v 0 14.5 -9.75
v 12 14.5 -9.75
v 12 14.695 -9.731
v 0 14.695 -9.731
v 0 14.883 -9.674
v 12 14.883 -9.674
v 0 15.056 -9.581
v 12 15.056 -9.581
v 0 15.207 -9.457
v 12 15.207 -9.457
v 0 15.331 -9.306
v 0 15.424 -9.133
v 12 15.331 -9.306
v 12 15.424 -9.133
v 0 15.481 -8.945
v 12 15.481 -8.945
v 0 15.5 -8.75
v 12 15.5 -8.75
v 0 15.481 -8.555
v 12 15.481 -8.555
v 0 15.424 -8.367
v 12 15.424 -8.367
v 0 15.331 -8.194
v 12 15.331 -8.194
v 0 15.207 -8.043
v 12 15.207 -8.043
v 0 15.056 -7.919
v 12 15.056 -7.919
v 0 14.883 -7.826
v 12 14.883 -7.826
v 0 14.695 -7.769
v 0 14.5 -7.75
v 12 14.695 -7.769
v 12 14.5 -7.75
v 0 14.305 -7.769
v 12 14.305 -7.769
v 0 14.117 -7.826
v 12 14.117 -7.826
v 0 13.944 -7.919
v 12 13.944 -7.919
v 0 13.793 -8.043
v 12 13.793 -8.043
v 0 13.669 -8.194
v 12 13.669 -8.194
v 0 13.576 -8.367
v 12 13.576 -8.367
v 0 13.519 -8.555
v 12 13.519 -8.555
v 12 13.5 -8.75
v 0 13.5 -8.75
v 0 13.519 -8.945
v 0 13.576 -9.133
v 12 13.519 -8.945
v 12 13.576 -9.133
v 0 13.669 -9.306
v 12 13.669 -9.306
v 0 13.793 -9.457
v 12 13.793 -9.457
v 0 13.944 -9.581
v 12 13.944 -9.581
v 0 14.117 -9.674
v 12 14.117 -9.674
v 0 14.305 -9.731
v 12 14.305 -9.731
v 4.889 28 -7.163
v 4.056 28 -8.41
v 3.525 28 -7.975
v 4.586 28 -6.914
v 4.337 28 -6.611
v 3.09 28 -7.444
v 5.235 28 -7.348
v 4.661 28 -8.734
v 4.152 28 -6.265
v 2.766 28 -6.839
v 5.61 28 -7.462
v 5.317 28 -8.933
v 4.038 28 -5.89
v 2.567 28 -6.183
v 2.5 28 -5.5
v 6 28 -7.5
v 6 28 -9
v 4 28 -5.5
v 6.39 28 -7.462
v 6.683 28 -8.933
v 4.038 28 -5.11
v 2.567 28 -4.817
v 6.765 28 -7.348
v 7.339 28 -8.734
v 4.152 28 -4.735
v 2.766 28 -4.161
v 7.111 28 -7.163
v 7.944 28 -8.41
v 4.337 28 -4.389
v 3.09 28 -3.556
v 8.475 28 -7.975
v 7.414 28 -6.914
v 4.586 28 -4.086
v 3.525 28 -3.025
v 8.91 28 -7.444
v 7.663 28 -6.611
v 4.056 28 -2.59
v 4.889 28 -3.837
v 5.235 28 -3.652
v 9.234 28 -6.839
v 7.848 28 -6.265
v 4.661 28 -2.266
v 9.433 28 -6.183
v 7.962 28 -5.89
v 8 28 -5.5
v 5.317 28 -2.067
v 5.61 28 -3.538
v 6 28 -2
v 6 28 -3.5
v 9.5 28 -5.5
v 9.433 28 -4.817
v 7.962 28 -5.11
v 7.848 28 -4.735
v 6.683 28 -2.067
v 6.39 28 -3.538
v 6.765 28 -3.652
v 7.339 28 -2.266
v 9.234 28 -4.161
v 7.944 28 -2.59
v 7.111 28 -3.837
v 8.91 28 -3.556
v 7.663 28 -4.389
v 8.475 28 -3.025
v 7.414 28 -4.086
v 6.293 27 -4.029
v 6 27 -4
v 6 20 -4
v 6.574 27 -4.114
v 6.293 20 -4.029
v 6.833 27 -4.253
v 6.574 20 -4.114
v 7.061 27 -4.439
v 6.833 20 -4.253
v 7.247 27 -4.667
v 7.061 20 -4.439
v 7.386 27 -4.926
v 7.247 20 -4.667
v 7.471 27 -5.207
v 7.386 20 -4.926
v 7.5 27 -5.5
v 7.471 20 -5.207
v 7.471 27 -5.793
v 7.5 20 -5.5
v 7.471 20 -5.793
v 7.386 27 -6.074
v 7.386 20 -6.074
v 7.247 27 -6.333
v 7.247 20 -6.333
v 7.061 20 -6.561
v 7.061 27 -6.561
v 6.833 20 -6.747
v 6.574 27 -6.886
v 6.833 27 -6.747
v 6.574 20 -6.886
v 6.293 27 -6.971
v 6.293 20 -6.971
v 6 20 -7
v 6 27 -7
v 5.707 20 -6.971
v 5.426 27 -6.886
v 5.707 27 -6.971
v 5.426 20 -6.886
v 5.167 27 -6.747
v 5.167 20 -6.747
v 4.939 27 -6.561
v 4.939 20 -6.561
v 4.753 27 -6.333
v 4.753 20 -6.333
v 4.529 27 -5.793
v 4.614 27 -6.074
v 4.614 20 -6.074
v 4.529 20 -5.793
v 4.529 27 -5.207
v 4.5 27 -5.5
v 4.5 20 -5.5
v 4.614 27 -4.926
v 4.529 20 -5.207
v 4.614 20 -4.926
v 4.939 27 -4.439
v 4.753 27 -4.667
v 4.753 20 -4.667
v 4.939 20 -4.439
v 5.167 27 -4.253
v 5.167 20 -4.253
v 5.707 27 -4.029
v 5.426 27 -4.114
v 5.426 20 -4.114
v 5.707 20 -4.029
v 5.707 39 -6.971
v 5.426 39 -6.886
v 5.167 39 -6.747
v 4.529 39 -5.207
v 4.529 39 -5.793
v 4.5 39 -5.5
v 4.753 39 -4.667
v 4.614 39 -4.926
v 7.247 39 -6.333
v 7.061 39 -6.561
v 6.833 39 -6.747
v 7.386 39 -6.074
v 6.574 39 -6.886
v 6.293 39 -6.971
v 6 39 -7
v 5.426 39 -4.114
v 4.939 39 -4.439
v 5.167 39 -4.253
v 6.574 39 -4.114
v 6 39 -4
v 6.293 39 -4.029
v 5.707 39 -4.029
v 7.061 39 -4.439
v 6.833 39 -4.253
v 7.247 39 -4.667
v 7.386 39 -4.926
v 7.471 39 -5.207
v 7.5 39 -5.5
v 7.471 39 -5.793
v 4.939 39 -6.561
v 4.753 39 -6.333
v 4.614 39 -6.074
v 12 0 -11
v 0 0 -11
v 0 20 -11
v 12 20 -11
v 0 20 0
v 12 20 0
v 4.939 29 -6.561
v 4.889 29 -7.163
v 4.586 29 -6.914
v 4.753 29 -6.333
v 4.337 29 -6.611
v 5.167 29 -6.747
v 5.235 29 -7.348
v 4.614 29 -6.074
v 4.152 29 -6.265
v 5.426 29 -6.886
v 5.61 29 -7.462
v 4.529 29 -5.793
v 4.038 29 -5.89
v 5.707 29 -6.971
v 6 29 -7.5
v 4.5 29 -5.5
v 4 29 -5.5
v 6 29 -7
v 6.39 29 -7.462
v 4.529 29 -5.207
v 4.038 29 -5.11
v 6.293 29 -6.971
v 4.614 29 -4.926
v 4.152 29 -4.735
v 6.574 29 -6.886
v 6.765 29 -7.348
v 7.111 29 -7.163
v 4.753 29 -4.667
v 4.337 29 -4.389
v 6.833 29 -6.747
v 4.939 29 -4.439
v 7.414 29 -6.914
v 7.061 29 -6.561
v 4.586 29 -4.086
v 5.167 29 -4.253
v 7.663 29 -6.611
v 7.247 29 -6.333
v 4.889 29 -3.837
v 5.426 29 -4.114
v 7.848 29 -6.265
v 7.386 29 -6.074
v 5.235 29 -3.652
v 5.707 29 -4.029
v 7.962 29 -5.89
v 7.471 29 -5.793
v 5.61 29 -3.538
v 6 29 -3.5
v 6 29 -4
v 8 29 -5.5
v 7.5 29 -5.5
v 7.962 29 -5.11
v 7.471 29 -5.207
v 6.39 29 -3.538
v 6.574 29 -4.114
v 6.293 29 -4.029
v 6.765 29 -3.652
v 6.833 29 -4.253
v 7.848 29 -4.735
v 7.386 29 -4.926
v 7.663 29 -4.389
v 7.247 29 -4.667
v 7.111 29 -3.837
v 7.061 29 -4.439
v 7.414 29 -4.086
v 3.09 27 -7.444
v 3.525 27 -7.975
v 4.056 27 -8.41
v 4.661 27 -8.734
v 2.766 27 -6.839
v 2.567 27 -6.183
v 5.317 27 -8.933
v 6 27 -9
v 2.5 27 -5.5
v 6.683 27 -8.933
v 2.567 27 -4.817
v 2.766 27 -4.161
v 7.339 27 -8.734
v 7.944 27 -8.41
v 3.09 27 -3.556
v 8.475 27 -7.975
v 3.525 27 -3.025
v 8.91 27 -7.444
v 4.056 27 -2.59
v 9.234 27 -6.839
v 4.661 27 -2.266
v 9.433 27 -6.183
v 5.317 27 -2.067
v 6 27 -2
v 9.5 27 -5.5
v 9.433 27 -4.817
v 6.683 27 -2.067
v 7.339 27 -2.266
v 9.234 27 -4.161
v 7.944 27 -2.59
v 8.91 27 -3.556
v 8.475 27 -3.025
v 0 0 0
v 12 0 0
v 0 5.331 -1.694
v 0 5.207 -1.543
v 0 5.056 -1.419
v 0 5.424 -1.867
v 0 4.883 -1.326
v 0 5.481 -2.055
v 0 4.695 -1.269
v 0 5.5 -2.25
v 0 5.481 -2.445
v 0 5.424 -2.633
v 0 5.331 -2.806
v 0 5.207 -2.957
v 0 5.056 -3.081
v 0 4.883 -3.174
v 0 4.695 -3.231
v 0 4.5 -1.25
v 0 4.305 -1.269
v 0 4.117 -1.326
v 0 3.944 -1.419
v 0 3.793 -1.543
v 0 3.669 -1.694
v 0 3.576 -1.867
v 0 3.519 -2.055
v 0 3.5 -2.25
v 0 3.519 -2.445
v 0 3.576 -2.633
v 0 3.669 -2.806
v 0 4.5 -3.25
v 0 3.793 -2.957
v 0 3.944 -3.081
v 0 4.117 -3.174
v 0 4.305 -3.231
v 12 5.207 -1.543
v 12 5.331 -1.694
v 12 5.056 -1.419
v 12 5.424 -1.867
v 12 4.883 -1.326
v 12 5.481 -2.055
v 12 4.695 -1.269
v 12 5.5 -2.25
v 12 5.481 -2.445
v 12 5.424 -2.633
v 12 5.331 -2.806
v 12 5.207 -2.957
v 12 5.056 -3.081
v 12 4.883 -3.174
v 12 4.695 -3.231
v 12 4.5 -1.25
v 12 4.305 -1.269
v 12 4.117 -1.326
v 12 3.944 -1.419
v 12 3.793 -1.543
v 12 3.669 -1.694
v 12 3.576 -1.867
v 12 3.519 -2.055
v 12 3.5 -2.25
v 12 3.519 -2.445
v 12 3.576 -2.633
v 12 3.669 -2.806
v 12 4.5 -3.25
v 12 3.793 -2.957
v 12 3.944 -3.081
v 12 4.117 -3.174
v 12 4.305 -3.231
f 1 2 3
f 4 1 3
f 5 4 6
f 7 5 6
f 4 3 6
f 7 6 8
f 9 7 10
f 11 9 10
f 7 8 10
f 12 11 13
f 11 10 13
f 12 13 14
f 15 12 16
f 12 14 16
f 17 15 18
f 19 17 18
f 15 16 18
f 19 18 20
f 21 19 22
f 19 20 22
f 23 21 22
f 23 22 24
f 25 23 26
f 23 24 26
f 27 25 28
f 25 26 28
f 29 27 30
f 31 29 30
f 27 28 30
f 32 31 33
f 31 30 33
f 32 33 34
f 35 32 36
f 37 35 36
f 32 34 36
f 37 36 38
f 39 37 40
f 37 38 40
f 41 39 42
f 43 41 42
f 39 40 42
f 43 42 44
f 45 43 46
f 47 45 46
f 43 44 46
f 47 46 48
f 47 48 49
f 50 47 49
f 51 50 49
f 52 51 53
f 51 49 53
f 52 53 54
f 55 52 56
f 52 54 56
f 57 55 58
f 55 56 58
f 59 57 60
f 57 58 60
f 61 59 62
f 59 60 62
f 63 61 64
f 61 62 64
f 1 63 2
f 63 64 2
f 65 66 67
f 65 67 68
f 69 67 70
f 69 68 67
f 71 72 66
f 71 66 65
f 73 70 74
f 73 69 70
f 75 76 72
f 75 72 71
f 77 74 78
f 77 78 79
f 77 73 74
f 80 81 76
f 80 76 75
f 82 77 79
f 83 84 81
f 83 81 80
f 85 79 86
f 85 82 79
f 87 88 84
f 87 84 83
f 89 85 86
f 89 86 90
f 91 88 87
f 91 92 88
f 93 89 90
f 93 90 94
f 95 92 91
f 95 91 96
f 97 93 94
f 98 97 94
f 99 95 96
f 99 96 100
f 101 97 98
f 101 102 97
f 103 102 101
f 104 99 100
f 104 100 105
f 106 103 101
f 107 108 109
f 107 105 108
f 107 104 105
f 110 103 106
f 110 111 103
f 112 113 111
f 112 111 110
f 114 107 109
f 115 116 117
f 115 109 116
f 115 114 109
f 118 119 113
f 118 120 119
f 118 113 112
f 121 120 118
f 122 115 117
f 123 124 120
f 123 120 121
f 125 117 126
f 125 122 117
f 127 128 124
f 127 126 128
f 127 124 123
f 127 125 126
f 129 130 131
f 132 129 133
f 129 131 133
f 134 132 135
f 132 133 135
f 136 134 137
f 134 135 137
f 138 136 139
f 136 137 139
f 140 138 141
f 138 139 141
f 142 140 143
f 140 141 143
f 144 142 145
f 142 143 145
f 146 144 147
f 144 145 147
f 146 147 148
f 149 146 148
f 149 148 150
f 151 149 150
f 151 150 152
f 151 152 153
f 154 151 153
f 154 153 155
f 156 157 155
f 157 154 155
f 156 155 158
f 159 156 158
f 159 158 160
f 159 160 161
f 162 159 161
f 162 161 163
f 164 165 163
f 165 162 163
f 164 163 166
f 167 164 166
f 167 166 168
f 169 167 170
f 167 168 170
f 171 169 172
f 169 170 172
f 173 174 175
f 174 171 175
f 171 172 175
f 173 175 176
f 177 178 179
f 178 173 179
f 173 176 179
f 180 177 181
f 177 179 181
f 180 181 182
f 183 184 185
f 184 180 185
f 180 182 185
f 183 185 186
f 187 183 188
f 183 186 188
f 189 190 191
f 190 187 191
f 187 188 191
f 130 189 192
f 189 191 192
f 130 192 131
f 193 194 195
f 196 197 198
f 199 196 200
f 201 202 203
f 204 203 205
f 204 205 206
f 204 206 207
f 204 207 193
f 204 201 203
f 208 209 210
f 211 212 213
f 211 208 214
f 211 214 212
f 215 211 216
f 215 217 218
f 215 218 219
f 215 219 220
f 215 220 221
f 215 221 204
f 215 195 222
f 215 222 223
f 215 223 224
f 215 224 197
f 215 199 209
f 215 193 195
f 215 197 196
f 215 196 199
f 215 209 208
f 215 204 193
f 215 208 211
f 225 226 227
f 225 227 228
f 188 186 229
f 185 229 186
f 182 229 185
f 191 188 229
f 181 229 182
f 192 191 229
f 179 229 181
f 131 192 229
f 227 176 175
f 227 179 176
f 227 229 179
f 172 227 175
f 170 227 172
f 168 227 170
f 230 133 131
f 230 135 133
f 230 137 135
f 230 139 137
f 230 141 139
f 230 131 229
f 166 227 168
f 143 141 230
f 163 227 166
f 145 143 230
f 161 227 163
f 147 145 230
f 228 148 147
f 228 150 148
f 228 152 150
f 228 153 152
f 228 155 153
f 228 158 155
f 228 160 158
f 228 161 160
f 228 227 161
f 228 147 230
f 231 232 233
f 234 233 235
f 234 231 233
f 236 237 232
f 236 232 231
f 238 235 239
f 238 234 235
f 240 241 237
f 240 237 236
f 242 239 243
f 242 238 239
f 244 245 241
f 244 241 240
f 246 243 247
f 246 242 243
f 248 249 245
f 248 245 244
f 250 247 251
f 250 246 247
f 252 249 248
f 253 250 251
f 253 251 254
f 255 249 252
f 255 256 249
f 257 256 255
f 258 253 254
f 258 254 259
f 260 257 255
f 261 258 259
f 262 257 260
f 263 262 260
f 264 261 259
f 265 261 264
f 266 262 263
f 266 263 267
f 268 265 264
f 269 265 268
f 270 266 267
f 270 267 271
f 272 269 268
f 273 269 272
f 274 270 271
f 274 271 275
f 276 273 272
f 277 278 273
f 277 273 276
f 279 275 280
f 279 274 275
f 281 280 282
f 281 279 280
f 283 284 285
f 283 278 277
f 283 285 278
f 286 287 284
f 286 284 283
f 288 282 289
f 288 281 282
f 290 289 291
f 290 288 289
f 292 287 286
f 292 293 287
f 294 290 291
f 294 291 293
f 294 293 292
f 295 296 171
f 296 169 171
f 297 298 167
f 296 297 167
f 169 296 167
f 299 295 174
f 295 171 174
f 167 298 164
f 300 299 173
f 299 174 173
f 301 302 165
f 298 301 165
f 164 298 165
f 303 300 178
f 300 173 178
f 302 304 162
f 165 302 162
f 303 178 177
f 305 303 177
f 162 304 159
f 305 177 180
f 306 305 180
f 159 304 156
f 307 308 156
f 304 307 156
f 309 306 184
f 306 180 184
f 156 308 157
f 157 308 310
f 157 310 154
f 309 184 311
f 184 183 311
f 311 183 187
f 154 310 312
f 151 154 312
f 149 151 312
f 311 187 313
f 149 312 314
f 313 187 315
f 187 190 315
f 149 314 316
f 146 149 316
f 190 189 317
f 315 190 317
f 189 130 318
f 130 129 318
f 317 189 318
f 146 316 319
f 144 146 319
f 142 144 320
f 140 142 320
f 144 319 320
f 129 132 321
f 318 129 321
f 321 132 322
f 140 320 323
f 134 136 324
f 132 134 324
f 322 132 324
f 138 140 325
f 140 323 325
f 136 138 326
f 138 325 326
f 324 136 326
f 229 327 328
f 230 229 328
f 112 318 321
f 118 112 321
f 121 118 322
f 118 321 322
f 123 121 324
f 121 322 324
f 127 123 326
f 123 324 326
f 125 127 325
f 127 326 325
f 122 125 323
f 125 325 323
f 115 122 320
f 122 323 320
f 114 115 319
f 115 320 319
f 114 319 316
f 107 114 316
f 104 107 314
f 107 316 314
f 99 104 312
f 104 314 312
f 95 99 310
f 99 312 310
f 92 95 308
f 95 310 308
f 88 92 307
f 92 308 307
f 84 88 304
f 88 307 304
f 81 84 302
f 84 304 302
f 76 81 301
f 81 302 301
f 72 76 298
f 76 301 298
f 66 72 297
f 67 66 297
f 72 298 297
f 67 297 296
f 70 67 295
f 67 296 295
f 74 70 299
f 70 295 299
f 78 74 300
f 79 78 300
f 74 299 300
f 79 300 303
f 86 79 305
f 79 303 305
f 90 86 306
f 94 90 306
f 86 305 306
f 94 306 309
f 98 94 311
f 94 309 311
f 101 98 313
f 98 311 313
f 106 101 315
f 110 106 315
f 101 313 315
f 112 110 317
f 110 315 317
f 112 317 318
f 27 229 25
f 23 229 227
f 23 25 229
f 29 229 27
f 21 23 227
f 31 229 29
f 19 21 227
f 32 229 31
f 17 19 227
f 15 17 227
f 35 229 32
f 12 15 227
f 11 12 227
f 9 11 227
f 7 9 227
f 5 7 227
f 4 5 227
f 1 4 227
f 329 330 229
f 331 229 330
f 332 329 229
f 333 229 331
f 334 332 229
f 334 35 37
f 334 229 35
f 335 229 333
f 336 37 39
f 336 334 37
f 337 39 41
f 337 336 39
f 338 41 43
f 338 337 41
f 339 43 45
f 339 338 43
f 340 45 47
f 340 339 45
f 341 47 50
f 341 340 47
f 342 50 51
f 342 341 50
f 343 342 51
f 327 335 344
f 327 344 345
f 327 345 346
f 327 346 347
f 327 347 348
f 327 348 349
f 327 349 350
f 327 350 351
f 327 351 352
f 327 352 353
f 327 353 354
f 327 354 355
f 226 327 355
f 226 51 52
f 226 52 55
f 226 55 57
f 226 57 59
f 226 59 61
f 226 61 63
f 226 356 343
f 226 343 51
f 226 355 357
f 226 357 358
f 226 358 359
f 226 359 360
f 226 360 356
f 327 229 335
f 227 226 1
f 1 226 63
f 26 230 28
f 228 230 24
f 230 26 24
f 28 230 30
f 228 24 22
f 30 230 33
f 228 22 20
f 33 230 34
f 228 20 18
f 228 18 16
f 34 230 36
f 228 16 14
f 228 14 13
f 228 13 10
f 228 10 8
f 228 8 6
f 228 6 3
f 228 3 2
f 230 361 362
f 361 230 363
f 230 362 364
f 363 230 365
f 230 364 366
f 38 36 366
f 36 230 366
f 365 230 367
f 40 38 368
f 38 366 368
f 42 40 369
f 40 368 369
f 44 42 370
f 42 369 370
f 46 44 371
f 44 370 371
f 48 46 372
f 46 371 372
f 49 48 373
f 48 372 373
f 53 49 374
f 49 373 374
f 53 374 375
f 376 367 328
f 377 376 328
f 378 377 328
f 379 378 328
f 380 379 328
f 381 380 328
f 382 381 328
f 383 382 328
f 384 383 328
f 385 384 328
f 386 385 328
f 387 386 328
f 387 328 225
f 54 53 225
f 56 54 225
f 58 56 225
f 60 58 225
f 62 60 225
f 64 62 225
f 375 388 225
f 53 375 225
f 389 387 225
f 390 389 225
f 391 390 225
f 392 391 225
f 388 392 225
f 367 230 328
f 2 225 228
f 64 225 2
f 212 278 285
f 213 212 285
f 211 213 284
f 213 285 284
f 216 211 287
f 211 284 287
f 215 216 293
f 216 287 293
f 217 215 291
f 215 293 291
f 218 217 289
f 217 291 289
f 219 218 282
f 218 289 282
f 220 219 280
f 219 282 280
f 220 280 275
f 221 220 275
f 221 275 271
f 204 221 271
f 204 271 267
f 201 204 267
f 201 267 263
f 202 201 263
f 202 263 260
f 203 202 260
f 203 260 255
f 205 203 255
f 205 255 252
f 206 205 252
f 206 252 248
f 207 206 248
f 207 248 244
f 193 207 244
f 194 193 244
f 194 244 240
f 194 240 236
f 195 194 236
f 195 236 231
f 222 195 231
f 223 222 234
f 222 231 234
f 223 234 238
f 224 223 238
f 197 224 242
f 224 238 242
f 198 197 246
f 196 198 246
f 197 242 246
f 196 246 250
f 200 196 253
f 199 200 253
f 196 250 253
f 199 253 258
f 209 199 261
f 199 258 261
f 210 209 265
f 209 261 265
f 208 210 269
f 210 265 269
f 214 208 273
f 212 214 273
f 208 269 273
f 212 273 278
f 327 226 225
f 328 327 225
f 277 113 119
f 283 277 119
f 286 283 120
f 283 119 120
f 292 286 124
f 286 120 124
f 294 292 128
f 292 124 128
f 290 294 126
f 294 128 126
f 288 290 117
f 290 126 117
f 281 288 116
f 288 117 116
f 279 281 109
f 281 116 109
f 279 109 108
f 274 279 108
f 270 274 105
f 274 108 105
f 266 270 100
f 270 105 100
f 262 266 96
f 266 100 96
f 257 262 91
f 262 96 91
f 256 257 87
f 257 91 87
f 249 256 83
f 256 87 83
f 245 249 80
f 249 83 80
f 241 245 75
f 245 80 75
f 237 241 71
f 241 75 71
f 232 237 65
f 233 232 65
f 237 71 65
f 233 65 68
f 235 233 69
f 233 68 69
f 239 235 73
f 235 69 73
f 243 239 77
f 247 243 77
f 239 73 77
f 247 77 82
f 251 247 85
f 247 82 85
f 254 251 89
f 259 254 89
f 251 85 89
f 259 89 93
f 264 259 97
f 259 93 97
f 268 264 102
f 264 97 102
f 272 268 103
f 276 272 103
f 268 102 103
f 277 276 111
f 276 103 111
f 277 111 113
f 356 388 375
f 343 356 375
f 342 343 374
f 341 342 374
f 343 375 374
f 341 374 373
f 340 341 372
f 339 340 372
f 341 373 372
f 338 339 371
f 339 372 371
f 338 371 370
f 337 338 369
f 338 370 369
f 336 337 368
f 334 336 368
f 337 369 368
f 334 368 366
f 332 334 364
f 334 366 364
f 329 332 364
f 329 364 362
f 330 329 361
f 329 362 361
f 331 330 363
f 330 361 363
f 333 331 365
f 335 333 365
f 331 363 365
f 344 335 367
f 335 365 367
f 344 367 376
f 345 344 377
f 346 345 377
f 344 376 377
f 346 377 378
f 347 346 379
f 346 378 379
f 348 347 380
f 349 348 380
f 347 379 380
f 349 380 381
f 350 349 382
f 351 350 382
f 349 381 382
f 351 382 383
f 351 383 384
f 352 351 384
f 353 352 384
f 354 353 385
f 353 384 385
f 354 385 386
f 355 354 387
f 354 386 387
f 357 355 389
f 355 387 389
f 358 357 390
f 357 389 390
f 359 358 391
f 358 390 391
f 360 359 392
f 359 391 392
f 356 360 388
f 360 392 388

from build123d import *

# Parameters (mm, degrees)
SKETCH1_W           = 12
SKETCH1_H           = 11
BOSS_EXTRUDE1_DEPTH = 20
SKETCH2_R           = 1.5
BOSS_EXTRUDE2_DEPTH = 19
SKETCH3_R           = 3.5
BOSS_EXTRUDE3_DEPTH = 1
SKETCH4_R           = 2
BOSS_EXTRUDE4_DEPTH = 1
SKETCH5_R           = 1
CUT_EXTRUDE1_DEPTH  = 12


with BuildPart() as part:
    # Sketch1 → Boss-Extrude1 (new body)
    with BuildSketch(Plane(origin=(0, 0, 0), x_dir=(1, 0, 0), z_dir=(0, 1, 0))):
        with Locations((6, 5.5)):
            Rectangle(SKETCH1_W, SKETCH1_H)
    extrude(amount=BOSS_EXTRUDE1_DEPTH)

    # Sketch2 → Boss-Extrude2 (add)
    with BuildSketch(Plane(origin=(0, 20, 0), x_dir=(1, 0, 0), z_dir=(0, 1, 0))):
        with Locations(Location((6, 5.5, 0), (0, 0, 270))):
            Circle(SKETCH2_R)
    extrude(amount=BOSS_EXTRUDE2_DEPTH)

    # Sketch3 → Boss-Extrude3 (add)
    with BuildSketch(Plane(origin=(0, 27, 0), x_dir=(1, 0, 0), z_dir=(0, 1, 0))):
        with Locations(Location((6, 5.5, 0), (0, 0, 270))):
            Circle(SKETCH3_R)
    extrude(amount=BOSS_EXTRUDE3_DEPTH)

    # Sketch4 → Boss-Extrude4 (add)
    with BuildSketch(Plane(origin=(0, 28, 0), x_dir=(1, 0, 0), z_dir=(0, 1, 0))):
        with Locations(Location((6, 5.5, 0), (0, 0, 270))):
            Circle(SKETCH4_R)
    extrude(amount=BOSS_EXTRUDE4_DEPTH)

    # Sketch5 → Cut-Extrude1 (cut)
    with BuildSketch(Plane(origin=(12, 0, 0), x_dir=(0, 0, -1), z_dir=(1, 0, 0))):
        with Locations((2.25, 4.5)):
            Circle(SKETCH5_R)
        with Locations((8.75, 14.5)):
            Circle(SKETCH5_R)
    extrude(amount=-CUT_EXTRUDE1_DEPTH, mode=Mode.SUBTRACT)


solid = part.part
